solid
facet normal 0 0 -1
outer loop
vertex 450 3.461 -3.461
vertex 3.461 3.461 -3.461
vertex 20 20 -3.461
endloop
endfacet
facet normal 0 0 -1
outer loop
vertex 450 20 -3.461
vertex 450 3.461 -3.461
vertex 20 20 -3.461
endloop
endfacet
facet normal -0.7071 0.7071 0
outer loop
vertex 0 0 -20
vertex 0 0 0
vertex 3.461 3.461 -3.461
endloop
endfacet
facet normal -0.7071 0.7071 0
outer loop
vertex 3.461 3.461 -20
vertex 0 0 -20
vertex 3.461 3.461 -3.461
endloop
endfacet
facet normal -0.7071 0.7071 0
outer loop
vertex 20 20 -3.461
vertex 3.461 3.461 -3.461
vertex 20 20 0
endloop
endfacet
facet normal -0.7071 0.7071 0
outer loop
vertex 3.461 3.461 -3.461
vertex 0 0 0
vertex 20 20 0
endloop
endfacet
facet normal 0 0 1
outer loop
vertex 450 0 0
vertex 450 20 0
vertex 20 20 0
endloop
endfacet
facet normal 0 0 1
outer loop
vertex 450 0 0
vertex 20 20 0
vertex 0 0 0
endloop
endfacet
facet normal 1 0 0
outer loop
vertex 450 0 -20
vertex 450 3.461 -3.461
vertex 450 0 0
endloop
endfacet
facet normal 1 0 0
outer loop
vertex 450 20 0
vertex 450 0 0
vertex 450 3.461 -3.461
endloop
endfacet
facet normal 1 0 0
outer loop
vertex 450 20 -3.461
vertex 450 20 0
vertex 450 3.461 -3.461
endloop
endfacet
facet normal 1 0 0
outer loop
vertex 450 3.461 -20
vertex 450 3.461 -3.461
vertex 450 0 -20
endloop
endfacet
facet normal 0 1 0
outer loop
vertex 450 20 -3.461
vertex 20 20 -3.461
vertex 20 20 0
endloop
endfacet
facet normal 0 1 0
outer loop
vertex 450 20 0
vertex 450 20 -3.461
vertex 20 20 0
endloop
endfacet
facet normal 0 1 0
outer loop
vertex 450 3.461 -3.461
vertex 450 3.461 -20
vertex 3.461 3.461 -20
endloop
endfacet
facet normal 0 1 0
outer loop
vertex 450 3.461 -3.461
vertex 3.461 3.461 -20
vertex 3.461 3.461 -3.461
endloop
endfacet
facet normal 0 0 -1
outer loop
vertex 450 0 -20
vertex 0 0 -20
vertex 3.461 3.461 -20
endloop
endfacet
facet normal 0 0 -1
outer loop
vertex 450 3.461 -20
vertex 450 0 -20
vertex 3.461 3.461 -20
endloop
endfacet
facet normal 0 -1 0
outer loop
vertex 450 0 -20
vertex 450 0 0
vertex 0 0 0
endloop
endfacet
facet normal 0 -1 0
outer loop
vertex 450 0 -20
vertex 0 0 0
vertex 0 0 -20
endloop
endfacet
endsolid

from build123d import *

# Parameters (mm, degrees)
BOSS_EXTRUDE1_DEPTH = 450
CUT_EXTRUDE1_DEPTH  = 451.888012704


with BuildPart() as part:
    # Sketch1 → Boss-Extrude1 (new body)
    with BuildSketch(Plane(origin=(0, 0, 0), x_dir=(0, 0, -1), z_dir=(1, 0, 0))):
        Polygon((0, 0), (20, 0), (20, 3.461178467), (3.461178467, 3.461178467), (3.461178467, 20), (0, 20), align=None)
    extrude(amount=BOSS_EXTRUDE1_DEPTH)

    # Sketch2 → Cut-Extrude1 (cut, through all)
    with BuildSketch(Plane(origin=(0, 0, 0), x_dir=(1, 0, 0), z_dir=(0, 0, -1))):
        Polygon((0, -20), (0, 0), (20, -20), align=None)
    extrude(amount=CUT_EXTRUDE1_DEPTH, mode=Mode.SUBTRACT)


solid = part.part
